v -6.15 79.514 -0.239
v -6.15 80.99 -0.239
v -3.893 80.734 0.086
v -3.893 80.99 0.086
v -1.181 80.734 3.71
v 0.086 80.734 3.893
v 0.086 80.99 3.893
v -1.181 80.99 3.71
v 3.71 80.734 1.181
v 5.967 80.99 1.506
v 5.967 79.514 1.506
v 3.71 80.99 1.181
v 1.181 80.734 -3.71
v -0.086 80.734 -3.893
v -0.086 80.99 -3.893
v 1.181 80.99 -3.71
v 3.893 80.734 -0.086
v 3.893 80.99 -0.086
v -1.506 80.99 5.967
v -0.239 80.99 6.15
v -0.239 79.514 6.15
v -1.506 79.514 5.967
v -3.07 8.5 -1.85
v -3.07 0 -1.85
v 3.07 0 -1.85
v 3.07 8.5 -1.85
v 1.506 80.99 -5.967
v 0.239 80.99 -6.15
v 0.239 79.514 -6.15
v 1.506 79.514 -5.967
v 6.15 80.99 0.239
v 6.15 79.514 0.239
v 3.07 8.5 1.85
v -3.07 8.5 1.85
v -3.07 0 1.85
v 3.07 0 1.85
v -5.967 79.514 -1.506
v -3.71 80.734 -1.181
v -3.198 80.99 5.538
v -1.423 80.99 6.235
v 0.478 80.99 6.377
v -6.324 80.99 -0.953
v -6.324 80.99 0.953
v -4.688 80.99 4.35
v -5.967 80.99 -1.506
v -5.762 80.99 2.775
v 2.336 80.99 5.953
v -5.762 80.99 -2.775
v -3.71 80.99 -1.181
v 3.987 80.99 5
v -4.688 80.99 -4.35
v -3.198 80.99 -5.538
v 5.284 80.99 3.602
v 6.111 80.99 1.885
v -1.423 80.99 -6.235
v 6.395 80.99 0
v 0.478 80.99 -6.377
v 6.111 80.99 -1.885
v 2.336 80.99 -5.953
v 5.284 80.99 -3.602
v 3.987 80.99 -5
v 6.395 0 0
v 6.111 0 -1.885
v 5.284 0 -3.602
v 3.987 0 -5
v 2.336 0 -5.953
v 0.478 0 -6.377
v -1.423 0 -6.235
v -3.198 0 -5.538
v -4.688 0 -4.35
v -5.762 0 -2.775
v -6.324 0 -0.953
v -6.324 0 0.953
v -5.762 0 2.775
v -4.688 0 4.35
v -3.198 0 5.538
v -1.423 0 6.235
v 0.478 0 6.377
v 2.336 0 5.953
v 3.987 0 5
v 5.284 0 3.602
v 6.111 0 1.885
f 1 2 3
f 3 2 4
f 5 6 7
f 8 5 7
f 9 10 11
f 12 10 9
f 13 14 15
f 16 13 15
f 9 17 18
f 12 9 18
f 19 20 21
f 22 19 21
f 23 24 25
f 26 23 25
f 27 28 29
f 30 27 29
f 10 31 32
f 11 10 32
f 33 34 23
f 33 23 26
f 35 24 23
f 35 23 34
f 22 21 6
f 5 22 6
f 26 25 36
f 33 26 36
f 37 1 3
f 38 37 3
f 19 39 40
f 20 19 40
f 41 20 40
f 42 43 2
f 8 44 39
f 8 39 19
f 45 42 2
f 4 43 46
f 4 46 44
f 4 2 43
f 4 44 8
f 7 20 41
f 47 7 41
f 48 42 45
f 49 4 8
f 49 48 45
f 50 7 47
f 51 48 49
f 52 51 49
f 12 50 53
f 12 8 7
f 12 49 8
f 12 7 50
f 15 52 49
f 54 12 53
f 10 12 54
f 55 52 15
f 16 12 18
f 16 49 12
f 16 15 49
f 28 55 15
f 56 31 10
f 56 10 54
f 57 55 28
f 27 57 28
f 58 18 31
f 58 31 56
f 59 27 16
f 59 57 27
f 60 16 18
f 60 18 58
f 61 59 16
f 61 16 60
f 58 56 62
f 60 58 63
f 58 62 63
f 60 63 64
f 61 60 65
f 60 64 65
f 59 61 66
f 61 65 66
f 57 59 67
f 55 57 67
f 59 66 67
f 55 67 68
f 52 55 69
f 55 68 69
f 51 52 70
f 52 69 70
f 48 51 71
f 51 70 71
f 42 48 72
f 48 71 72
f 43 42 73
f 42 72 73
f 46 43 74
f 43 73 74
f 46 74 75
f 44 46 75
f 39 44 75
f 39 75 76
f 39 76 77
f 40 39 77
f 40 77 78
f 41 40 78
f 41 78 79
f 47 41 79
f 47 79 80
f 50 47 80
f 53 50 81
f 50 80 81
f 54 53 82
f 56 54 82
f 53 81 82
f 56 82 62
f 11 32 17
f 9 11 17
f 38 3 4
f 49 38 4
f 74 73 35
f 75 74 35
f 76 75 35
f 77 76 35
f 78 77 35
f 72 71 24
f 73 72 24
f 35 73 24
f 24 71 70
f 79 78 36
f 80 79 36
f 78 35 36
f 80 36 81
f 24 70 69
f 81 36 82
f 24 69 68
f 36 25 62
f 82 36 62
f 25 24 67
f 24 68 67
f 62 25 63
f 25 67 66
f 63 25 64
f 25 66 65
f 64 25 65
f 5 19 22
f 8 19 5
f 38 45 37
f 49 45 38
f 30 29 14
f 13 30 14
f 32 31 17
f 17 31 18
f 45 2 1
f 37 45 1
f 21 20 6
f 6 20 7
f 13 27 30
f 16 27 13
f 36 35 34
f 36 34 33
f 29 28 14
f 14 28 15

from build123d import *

# Parameters (mm, degrees)
SKETCH1_R           = 6.395
BOSS_EXTRUDE1_DEPTH = 80.99
SKETCH3_W           = 6.14
SKETCH3_H           = 3.7
CUT_EXTRUDE2_DEPTH  = 8.5
CUT_EXTRUDE3_DEPTH  = 1.28
CIRPATTERN1_COUNT   = 4


with BuildPart() as part:
    # Sketch1 → Boss-Extrude1 (new body)
    with BuildSketch(Plane(origin=(0, 0, 0), x_dir=(1, 0, 0), z_dir=(0, 1, 0))):
        Circle(SKETCH1_R)
    extrude(amount=BOSS_EXTRUDE1_DEPTH)

    # Sketch3 → Cut-Extrude2 (cut)
    with BuildSketch(Plane.XZ):
        Rectangle(SKETCH3_W, SKETCH3_H)
    extrude(amount=-CUT_EXTRUDE2_DEPTH, mode=Mode.SUBTRACT)

    # Sketch4 → Cut-Extrude3 (cut)
    with BuildSketch(Plane(origin=(-0.091269963, 0, 0.633458597), x_dir=(0.989779057, 0, 0.142609318), z_dir=(-0.142609318, 0, 0.989779057))):
        Polygon((-3.84099181, 80.99), (-6.12099181, 80.99), (-6.12099181, 79.513663006), (-3.84099181, 80.733663006), align=None)
    cut_extrude3 = extrude(amount=-CUT_EXTRUDE3_DEPTH, mode=Mode.SUBTRACT)

    # CirPattern1: Cut-Extrude3 ×4 about axis
    cirpattern1_axis = Axis((0, 0, 0), (0, 1, 0))
    for i in range(1, CIRPATTERN1_COUNT):
        add(cut_extrude3.rotate(cirpattern1_axis, i * 360 / CIRPATTERN1_COUNT), mode=Mode.SUBTRACT)


solid = part.part
